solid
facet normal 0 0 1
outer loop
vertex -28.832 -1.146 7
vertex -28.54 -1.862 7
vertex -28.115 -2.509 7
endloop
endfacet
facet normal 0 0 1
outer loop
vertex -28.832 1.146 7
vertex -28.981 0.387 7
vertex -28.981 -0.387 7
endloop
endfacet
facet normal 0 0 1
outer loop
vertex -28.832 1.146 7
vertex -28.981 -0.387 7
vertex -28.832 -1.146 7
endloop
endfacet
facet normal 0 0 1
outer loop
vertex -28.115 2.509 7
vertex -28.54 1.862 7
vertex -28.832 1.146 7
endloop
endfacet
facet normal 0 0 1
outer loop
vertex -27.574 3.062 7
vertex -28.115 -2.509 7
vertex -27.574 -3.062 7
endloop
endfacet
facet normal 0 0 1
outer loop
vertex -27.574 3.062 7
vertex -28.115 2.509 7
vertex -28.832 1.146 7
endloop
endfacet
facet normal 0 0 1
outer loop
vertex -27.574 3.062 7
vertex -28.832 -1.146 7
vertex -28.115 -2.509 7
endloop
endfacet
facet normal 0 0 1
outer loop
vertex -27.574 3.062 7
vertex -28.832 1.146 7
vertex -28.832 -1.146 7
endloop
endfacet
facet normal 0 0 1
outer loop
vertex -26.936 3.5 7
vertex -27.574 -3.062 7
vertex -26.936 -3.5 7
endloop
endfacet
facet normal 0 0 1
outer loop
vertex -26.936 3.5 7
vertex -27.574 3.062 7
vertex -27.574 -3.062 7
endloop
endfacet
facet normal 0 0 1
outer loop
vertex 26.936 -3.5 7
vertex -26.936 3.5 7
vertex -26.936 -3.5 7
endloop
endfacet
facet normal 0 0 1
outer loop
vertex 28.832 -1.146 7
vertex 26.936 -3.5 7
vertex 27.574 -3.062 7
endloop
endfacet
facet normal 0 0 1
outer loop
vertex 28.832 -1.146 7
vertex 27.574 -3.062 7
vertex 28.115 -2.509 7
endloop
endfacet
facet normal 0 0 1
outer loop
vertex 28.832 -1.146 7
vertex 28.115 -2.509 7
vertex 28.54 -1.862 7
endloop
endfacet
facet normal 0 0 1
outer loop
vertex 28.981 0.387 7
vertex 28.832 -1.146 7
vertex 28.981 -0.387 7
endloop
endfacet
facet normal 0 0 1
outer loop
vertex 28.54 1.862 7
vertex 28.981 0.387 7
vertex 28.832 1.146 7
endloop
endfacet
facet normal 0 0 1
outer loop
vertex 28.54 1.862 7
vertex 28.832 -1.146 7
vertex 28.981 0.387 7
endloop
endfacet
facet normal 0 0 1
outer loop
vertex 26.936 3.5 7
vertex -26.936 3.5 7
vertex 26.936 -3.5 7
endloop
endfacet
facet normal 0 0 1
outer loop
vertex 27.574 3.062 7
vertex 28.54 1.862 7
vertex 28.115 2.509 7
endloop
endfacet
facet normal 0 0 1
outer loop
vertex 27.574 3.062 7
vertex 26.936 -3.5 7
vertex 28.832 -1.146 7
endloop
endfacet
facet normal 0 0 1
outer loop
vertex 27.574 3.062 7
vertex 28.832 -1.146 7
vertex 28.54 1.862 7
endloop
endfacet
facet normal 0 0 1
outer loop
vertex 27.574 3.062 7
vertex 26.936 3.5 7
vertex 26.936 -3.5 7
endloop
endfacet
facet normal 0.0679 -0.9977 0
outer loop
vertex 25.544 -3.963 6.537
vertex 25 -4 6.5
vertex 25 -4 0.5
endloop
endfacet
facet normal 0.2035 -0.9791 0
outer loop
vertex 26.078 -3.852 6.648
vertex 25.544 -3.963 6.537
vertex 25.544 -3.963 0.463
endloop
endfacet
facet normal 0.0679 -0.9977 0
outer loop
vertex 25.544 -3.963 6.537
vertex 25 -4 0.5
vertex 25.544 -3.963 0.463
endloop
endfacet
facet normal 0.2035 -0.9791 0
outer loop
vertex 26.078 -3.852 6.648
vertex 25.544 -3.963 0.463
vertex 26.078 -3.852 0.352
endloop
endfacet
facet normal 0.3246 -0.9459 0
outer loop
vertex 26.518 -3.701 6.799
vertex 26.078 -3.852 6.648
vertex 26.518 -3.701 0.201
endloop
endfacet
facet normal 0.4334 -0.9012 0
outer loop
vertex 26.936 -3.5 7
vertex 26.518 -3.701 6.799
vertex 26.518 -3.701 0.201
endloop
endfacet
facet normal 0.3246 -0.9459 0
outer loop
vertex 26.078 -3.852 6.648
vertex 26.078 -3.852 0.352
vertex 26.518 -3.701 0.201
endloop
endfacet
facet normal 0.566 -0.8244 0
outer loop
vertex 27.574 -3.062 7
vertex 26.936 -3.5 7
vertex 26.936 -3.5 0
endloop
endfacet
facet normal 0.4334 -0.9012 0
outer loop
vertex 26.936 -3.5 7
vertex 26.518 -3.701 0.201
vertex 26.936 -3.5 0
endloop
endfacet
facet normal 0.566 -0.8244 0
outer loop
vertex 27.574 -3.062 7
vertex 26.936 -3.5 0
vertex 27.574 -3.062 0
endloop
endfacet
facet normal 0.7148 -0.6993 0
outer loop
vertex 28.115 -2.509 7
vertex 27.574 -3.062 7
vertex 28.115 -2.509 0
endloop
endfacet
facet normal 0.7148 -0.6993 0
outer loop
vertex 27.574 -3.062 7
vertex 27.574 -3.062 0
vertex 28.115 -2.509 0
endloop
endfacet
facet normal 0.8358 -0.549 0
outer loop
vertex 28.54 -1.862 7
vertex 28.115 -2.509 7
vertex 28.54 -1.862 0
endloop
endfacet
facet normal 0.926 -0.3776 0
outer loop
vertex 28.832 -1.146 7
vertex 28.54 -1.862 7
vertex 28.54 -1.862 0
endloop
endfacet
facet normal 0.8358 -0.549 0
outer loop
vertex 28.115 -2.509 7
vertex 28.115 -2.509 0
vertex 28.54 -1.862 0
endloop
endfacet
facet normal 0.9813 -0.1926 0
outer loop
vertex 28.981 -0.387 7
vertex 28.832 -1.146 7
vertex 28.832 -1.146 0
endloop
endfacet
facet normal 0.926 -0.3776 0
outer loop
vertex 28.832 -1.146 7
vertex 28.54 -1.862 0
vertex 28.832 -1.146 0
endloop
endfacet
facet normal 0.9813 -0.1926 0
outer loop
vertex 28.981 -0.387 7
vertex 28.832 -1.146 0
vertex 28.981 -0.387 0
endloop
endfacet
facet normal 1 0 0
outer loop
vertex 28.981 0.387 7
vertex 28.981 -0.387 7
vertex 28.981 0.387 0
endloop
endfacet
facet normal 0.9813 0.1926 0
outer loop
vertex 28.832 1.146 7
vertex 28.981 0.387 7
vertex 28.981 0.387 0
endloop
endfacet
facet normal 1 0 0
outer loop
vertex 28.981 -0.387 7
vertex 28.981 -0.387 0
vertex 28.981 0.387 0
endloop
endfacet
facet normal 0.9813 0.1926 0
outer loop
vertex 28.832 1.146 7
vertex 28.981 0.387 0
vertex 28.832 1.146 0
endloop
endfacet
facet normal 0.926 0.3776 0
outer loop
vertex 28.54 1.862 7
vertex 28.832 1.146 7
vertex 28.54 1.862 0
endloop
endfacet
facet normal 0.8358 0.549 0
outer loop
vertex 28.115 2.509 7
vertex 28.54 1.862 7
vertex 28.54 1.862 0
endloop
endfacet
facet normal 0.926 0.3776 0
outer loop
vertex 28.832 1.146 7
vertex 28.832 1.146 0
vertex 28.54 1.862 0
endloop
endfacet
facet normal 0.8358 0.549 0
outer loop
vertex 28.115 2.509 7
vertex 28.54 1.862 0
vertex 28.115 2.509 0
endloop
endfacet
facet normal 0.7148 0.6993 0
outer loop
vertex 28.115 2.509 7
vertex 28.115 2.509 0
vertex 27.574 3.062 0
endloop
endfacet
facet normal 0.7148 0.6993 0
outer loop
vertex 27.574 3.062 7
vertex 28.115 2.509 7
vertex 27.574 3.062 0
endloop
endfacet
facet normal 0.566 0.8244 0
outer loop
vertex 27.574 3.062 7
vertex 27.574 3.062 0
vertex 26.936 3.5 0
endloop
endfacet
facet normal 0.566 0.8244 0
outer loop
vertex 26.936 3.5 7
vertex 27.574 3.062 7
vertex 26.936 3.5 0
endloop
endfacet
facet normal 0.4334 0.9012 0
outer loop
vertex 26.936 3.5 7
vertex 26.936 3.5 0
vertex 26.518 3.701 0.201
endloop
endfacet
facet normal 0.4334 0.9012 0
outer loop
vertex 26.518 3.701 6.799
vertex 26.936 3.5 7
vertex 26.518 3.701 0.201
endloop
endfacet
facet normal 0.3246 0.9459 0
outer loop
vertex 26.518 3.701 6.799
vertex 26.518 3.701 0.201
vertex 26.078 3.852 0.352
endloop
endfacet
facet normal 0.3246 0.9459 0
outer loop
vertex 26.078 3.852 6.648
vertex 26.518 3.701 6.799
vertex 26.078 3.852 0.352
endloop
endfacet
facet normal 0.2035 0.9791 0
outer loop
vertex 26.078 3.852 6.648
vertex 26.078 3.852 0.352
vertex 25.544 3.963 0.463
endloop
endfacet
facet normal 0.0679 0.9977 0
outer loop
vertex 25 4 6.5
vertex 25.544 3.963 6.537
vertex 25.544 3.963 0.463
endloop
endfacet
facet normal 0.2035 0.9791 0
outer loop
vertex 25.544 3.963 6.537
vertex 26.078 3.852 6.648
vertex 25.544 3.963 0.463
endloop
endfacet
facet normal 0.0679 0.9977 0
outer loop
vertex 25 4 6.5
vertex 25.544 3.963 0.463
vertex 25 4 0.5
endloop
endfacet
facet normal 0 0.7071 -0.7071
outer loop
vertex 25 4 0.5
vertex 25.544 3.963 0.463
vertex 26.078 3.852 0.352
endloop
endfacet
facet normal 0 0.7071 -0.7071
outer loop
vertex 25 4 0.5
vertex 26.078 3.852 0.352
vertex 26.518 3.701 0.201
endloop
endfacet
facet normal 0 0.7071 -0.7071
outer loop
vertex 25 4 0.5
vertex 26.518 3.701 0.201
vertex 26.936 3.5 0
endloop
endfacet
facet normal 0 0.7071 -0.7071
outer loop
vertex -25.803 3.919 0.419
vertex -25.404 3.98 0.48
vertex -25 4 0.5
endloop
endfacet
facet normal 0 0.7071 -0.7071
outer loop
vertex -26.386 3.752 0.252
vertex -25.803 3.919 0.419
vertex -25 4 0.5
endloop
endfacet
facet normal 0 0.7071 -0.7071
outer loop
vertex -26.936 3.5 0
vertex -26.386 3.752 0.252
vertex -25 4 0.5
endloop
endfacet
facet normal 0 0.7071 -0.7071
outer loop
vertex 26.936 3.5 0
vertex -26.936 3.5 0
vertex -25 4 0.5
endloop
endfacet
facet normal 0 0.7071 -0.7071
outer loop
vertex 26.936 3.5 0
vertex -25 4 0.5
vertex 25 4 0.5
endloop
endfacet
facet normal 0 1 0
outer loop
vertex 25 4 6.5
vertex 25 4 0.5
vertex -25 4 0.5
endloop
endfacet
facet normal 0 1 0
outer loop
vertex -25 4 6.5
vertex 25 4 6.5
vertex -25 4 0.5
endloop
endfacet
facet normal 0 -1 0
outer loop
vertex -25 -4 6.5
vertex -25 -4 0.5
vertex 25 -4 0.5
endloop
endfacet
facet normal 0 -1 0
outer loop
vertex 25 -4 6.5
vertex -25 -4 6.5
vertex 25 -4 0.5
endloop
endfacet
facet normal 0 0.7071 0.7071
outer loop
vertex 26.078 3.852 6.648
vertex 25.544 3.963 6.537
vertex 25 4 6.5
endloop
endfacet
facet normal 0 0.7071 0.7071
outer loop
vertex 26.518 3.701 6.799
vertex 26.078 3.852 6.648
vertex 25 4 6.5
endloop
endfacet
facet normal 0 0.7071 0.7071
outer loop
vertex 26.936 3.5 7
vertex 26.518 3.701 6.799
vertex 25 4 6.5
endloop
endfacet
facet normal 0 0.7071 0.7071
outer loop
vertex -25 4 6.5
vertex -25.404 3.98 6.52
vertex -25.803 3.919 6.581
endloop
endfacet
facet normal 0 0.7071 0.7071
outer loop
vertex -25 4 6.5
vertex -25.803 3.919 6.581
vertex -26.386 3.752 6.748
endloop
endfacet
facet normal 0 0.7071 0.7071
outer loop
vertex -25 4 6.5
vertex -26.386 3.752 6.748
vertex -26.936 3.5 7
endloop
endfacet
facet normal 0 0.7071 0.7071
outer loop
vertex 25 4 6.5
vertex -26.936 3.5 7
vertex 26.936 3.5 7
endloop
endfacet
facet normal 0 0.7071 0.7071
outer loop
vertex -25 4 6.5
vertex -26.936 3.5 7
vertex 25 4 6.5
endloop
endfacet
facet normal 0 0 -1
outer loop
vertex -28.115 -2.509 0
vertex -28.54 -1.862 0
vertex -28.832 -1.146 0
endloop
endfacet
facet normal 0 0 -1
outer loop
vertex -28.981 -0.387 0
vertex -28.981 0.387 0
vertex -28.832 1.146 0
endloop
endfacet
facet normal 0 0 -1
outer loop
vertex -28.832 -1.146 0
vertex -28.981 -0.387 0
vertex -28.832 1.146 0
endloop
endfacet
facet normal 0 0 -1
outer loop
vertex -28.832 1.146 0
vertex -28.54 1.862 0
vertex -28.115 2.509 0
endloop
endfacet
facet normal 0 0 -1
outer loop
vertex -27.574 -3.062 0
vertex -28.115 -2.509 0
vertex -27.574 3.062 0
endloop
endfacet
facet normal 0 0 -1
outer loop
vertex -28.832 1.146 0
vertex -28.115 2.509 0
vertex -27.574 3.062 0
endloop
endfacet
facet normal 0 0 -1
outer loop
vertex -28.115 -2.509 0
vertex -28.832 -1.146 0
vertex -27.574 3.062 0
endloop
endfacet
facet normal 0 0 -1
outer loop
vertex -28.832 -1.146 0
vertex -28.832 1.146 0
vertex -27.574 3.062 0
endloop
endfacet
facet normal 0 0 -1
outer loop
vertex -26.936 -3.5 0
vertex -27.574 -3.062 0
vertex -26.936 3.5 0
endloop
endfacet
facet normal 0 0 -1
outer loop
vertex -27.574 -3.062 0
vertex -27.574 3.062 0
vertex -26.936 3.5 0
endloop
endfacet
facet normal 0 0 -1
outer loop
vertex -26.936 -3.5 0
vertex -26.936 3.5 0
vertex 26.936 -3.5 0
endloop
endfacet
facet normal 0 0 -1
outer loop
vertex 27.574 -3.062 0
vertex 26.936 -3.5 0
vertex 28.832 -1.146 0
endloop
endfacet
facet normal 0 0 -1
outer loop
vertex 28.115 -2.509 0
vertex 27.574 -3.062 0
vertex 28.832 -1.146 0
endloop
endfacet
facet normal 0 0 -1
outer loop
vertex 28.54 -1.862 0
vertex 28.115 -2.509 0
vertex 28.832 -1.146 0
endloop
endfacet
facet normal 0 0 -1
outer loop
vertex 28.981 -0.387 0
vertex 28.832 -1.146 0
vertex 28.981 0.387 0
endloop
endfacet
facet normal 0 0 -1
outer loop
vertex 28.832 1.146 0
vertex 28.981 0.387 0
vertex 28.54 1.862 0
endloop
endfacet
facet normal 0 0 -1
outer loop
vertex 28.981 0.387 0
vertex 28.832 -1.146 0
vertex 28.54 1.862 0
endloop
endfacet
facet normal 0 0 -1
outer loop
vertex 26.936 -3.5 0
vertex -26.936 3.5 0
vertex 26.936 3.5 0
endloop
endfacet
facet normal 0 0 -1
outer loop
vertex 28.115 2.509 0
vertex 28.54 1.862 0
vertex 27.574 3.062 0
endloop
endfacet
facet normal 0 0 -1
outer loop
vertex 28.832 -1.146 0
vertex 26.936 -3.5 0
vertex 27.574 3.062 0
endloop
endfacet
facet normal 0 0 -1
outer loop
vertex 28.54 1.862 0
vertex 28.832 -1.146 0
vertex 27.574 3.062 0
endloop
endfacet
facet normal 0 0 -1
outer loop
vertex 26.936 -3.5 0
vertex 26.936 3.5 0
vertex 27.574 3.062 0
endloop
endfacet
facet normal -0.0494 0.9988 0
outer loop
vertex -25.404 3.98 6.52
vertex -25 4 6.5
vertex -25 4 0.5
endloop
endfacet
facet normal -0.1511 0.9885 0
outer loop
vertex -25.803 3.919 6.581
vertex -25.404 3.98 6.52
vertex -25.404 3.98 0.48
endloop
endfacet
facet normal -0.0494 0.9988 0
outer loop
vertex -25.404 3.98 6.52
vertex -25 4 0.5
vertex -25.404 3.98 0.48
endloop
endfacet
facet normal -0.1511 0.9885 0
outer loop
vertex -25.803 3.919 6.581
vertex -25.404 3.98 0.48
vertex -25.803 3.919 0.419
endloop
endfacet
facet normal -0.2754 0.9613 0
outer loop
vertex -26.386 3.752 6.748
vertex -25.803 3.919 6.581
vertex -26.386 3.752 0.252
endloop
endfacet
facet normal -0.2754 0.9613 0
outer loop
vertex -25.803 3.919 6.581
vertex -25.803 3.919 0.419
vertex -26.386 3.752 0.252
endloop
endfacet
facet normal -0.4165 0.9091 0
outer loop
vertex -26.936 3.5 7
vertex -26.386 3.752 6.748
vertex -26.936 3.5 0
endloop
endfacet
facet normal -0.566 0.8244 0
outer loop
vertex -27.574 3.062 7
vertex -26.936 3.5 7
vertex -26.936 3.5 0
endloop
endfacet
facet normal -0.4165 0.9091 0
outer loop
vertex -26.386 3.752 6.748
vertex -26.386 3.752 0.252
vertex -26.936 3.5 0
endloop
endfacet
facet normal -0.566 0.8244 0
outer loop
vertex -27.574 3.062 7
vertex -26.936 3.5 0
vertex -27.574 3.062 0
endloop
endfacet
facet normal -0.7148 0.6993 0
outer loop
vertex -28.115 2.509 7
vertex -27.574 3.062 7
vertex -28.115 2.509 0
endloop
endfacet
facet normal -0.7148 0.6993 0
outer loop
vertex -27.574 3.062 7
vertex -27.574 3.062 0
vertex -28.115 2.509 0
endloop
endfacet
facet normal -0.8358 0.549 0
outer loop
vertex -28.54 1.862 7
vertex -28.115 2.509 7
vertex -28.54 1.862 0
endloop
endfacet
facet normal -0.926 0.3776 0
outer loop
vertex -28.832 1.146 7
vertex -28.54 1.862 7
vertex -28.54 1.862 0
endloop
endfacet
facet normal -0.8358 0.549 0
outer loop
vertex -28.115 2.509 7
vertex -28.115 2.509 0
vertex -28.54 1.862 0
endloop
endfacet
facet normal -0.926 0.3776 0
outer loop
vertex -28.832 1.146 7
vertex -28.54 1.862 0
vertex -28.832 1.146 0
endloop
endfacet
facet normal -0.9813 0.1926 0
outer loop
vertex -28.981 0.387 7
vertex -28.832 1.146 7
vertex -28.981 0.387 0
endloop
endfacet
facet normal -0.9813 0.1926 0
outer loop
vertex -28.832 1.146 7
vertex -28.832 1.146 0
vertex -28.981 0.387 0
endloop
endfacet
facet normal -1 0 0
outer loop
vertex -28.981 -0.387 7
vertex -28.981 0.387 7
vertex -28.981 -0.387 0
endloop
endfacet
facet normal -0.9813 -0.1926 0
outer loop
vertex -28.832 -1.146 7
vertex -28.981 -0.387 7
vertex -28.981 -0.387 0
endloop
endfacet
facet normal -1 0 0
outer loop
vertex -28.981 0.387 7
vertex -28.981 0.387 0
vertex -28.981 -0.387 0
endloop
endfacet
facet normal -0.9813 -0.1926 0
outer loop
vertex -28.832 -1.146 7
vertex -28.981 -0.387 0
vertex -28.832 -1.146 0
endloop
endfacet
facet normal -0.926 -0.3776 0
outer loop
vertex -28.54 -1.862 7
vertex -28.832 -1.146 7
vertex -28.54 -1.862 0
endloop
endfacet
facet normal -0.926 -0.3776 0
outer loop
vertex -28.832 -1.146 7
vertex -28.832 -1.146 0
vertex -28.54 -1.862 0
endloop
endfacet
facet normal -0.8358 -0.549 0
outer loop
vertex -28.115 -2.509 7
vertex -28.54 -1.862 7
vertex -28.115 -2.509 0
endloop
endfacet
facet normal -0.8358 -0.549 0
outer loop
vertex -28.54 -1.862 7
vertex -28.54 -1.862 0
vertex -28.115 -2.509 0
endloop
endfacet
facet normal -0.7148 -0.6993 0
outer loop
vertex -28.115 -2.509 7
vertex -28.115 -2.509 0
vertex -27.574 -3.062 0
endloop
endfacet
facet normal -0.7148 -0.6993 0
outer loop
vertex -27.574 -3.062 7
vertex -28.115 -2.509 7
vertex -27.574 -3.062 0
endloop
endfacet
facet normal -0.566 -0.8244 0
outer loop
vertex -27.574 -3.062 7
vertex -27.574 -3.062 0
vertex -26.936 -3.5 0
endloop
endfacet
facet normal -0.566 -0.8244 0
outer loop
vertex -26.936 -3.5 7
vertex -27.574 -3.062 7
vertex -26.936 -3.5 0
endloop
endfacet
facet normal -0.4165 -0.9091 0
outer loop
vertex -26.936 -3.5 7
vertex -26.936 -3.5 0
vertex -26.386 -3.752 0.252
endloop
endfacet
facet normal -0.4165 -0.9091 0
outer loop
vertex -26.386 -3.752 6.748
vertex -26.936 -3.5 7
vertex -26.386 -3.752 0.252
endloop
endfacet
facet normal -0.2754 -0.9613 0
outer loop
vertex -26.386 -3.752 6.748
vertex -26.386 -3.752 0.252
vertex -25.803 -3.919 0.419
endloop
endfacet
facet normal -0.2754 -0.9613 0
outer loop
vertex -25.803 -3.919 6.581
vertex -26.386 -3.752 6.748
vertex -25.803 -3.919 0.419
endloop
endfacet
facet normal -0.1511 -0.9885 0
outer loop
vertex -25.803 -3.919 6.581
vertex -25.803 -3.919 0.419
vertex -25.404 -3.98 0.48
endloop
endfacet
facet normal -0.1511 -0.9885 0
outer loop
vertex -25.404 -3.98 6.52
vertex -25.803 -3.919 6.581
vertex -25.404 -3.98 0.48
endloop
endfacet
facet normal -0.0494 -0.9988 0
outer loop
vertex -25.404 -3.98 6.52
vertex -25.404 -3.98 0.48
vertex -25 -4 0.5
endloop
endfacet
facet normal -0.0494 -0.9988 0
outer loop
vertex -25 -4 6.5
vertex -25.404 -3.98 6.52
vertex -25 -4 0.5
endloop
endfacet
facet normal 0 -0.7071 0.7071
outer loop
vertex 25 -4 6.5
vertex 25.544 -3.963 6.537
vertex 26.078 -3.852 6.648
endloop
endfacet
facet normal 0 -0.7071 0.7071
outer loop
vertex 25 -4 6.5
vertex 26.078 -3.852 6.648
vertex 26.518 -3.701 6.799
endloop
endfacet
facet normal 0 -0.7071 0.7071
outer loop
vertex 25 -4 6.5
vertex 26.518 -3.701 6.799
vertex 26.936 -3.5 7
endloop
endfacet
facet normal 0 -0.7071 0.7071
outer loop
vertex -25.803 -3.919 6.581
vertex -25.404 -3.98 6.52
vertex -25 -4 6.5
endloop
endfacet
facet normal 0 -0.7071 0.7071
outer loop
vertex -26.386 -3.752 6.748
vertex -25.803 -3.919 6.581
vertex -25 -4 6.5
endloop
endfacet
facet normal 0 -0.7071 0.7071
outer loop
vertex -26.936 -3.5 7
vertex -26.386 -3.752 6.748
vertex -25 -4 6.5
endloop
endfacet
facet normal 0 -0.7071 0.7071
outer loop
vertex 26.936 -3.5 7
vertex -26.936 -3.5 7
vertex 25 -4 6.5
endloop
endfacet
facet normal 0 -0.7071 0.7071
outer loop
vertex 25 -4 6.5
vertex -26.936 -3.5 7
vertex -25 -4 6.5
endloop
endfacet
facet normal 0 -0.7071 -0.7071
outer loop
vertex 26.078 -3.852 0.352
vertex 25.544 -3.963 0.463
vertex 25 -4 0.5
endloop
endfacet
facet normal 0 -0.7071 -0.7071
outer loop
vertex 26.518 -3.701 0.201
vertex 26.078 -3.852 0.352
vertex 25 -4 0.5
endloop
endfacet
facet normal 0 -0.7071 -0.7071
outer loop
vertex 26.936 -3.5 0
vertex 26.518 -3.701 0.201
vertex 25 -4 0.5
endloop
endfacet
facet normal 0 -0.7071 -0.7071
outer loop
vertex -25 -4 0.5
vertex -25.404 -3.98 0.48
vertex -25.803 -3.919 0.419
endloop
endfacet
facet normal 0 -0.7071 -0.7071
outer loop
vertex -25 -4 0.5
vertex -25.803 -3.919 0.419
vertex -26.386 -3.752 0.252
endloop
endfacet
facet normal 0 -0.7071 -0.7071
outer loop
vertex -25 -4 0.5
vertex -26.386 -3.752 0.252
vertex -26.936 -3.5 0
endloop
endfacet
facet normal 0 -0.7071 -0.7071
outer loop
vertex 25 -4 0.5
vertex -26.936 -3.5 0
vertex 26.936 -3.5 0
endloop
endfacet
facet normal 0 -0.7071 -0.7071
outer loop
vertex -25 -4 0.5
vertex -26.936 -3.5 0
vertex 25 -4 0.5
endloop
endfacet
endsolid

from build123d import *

# Parameters (mm, degrees)
F1_DEPTH    = 7
F2_T1_DEPTH = 54.3718610795


# Not quite as in the source:
# - a fillet or chamfer that OpenCascade refuses, or shapes differently, is made with other operations: its cross-section is extruded or revolved along the edge and cut away or added


with BuildPart() as f1:
    # F0 (on Top) → F1 (new body)
    with BuildSketch(Plane.XY):
        with BuildLine():
            Line((-25, -4), (25, -4))
            ThreePointArc((25, -4), (29, 0), (25, 4))
            Line((25, 4), (-25, 4))
            ThreePointArc((-25, 4), (-29, 0), (-25, -4))
        make_face()
    extrude(amount=F1_DEPTH)

    # F2: chamfer of 0.5 on 4 edges, made by hand

    # F2_s2 → F2_t1 (cut)
    with BuildSketch(Plane.YZ.offset(-27.1859305398)):
        Polygon((-4, 6.5), (-3.5, 7), (-4, 7), align=None)
        Polygon((4, 6.5), (3.5, 7), (4, 7), align=None)
        Polygon((-4, 0.5), (-3.5, 0), (-4, 0), align=None)
        Polygon((4, 0.5), (3.5, 0), (4, 0), align=None)
    extrude(amount=F2_T1_DEPTH, mode=Mode.SUBTRACT)


solid = f1.part
